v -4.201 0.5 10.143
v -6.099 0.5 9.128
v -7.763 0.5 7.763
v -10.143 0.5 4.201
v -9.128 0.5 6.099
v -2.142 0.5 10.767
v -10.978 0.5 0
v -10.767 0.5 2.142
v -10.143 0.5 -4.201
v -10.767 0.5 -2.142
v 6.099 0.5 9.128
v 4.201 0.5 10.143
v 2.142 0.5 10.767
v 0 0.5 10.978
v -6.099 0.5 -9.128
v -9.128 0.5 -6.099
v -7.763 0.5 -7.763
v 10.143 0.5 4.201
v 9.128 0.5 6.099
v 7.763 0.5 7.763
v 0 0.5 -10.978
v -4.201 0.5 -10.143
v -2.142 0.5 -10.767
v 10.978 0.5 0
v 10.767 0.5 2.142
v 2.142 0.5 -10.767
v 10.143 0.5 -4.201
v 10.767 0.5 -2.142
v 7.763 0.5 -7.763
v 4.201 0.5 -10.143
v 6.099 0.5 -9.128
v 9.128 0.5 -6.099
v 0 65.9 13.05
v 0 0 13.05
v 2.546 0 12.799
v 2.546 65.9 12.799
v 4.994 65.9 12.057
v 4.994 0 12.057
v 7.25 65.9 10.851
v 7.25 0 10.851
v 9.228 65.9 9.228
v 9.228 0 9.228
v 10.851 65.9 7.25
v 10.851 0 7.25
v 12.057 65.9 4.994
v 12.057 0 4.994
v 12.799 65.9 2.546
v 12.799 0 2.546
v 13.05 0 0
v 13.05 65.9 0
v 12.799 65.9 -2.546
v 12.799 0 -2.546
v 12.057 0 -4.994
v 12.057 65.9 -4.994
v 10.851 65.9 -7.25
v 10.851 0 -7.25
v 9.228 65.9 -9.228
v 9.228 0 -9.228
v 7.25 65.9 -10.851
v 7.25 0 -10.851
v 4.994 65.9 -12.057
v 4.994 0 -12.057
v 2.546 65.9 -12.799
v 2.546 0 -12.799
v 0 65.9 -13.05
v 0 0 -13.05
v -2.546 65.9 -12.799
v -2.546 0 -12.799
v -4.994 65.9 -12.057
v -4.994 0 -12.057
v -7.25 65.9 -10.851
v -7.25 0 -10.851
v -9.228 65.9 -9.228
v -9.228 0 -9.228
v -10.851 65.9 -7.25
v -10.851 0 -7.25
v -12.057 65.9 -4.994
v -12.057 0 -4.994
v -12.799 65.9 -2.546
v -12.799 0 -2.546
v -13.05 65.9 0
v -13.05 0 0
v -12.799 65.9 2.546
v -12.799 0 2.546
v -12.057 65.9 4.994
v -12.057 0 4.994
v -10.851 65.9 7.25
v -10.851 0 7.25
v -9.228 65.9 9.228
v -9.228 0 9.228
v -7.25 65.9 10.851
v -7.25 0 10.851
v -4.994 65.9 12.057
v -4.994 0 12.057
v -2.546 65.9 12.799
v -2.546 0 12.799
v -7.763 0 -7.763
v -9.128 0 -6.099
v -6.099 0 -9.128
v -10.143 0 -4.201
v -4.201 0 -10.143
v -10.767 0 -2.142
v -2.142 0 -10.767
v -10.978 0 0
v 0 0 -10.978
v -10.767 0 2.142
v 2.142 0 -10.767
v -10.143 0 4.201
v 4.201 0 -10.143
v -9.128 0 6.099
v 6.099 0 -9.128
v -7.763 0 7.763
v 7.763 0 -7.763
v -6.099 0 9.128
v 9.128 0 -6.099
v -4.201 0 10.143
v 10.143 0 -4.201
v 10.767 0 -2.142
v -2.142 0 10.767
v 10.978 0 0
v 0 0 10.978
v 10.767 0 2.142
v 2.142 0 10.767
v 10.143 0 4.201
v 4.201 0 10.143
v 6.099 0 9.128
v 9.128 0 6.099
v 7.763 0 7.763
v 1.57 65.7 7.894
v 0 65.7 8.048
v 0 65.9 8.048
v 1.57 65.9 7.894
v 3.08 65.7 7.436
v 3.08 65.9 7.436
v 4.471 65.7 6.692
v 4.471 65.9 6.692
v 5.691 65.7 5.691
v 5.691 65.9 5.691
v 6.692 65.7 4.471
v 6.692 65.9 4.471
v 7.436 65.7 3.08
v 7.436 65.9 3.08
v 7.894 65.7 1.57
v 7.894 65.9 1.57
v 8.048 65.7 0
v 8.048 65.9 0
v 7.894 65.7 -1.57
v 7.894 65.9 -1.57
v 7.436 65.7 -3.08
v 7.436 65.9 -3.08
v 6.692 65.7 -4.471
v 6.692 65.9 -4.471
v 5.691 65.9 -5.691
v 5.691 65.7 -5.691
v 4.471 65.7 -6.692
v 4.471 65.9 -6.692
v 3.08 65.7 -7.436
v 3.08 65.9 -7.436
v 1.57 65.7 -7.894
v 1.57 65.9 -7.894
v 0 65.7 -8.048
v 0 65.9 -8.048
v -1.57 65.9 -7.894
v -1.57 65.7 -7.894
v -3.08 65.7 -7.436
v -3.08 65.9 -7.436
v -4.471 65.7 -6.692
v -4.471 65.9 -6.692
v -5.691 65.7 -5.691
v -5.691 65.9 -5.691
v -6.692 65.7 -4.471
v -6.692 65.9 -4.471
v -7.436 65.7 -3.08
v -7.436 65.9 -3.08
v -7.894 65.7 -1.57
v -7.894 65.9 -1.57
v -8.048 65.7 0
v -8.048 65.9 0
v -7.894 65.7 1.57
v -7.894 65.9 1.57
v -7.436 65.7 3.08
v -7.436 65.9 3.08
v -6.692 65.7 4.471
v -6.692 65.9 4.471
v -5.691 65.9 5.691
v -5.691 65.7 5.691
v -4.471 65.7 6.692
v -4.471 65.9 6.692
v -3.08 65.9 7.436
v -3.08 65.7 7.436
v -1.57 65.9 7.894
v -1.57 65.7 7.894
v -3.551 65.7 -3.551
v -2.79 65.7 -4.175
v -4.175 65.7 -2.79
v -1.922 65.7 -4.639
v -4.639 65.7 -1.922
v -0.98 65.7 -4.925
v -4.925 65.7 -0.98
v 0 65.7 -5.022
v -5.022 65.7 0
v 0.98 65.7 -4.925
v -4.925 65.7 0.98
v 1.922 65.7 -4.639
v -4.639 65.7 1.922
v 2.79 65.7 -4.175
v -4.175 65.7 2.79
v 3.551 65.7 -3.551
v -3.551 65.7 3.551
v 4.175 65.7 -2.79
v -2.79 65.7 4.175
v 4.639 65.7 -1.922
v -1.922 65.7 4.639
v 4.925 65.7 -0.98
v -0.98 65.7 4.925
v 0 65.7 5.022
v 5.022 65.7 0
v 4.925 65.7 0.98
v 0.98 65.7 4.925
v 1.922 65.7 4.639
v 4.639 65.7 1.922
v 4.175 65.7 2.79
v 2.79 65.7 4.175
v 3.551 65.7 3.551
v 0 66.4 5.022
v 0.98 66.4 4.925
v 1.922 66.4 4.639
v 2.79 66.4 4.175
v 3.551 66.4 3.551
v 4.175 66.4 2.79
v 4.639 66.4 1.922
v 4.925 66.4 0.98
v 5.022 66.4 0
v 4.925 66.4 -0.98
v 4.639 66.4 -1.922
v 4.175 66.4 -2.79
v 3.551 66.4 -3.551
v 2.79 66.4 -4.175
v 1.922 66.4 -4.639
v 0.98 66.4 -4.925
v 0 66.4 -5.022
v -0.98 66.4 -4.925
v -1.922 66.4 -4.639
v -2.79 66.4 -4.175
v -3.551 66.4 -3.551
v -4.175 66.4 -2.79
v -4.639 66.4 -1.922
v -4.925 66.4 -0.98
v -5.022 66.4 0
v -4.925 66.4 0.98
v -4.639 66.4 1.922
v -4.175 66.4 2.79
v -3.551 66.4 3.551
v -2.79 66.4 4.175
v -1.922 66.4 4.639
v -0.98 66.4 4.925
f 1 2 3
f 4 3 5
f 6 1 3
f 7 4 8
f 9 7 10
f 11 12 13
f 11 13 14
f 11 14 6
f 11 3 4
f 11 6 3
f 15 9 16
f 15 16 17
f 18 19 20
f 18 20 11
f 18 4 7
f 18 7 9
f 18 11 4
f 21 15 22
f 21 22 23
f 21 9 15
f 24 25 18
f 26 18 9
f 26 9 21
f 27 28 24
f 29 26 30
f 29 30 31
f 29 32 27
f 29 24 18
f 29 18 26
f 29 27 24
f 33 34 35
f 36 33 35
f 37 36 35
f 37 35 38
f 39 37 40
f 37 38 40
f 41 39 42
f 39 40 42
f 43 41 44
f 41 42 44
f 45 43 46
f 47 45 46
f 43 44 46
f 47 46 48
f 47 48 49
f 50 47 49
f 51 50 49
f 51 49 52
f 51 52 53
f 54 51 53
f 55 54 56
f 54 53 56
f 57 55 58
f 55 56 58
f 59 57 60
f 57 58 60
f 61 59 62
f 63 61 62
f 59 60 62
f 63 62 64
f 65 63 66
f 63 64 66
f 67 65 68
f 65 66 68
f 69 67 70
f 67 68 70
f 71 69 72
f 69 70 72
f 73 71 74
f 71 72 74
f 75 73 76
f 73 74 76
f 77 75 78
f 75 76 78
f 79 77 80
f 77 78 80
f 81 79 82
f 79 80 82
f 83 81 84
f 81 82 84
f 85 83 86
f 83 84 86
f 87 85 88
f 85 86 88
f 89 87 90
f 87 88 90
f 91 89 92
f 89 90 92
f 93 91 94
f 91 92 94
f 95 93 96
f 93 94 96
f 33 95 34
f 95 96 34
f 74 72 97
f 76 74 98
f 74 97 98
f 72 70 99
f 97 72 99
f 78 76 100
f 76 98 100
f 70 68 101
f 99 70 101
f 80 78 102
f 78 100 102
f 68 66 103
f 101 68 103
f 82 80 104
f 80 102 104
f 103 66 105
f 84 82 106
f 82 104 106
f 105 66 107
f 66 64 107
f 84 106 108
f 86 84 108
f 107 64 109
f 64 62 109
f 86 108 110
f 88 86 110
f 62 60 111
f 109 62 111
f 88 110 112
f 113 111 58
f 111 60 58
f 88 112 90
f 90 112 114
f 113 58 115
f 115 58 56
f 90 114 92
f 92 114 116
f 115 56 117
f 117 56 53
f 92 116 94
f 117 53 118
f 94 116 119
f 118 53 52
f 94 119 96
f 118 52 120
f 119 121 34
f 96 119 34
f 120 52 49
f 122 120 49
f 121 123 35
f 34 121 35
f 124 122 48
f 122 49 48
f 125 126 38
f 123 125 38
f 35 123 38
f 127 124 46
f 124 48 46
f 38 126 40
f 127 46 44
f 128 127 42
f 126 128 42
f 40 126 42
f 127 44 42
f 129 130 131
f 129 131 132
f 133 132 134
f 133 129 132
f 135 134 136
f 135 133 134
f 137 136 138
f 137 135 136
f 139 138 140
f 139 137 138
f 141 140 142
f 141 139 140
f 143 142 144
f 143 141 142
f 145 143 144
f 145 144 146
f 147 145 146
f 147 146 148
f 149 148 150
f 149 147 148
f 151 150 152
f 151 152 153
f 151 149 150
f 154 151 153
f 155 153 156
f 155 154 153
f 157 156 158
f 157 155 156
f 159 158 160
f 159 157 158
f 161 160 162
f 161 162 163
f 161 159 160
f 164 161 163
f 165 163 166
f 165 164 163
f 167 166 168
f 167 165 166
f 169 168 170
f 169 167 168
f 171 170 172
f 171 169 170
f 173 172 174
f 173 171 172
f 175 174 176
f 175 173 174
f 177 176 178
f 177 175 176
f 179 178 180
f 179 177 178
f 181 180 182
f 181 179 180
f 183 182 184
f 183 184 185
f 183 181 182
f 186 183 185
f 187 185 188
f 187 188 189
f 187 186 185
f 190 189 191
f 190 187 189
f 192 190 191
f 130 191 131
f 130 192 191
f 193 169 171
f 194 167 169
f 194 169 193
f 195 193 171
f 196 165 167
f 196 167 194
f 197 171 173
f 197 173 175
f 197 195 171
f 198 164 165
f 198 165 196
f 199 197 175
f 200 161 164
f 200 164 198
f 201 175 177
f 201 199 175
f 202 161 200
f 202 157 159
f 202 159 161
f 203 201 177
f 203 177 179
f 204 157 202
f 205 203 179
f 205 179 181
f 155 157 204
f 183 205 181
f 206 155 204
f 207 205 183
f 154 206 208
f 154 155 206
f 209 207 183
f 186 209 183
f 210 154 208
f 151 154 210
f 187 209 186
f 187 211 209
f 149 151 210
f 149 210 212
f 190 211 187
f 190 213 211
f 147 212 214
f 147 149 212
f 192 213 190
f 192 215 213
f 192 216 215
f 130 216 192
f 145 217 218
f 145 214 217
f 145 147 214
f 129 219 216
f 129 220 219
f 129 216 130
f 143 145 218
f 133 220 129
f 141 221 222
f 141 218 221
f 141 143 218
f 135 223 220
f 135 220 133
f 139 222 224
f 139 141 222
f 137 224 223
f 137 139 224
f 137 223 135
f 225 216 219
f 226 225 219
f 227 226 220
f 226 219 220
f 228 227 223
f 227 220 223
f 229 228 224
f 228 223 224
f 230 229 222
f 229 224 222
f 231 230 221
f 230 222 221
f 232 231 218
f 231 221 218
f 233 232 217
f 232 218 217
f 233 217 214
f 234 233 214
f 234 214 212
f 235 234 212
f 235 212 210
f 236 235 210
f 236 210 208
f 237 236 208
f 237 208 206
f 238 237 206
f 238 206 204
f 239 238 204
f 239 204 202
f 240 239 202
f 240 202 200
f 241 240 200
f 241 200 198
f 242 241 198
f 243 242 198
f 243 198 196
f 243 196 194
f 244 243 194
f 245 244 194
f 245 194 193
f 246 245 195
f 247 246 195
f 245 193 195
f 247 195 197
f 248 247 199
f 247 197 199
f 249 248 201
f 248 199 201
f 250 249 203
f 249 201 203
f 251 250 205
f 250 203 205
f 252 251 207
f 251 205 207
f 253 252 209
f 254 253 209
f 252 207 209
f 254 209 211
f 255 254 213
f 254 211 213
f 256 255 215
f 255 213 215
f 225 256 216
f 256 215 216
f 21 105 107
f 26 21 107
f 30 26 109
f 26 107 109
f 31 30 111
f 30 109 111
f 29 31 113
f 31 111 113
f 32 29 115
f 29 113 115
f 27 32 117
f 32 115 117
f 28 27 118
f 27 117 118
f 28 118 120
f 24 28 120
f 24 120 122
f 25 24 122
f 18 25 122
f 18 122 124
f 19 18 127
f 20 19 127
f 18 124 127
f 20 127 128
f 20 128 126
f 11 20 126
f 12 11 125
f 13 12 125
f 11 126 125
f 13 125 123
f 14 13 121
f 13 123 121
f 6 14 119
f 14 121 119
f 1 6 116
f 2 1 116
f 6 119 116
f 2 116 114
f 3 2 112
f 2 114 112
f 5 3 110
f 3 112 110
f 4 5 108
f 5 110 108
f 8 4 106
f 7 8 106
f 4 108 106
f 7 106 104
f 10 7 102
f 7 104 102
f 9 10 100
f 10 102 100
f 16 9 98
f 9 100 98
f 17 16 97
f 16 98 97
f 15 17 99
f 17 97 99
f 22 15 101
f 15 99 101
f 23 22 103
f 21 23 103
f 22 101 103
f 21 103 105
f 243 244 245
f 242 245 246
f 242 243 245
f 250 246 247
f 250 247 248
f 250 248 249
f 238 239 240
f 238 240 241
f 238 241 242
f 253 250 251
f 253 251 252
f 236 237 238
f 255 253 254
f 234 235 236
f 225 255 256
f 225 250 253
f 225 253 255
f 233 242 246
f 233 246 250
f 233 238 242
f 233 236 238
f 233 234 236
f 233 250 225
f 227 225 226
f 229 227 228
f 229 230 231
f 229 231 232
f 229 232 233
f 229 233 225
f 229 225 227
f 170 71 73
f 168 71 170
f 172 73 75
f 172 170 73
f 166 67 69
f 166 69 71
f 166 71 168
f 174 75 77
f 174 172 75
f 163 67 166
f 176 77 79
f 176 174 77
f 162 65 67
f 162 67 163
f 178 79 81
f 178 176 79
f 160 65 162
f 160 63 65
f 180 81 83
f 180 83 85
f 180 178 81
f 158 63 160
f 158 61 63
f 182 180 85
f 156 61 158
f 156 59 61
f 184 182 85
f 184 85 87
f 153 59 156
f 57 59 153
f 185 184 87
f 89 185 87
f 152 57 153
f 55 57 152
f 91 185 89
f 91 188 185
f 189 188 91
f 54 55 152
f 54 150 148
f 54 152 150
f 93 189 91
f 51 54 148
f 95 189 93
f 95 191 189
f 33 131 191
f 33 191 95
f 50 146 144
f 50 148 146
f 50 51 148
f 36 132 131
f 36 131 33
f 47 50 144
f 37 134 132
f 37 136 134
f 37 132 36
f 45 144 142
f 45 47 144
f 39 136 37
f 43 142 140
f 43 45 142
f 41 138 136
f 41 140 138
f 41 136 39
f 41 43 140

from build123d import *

# Parameters (mm, degrees)
SKETCH_1_R          = 13.05
EXTRUDE_1_DEPTH     = 65.9
SKETCH_2_R          = 10.978194701
CUT_EXTRUDE_1_DEPTH = 0.5
SKETCH_3_R          = 5.021706909
EXTRUDE_2_DEPTH     = 0.5
CUT_EXTRUDE_START   = -0.2
SKETCH_4_R          = 8.048308781
SKETCH_4_R_2        = 5.021706909
CUT_EXTRUDE_2_DEPTH = 0.2


with BuildPart() as part:
    # 草图1 → 凸台-拉伸1 (new body)
    with BuildSketch(Plane(origin=(0, 0, 0), x_dir=(1, 0, 0), z_dir=(0, 1, 0))):
        with Locations(Location((0, 0, 0), (0, 0, 270))):
            Circle(SKETCH_1_R)
    extrude(amount=EXTRUDE_1_DEPTH)

    # 草图2 → 切除-拉伸1 (cut)
    with BuildSketch(Plane.XZ):
        with Locations(Location((0, 0, 0), (0, 0, 270))):
            Circle(SKETCH_2_R)
    extrude(amount=-CUT_EXTRUDE_1_DEPTH, mode=Mode.SUBTRACT)

    # 草图3 → 凸台-拉伸2 (add)
    with BuildSketch(Plane(origin=(0, 65.9, 0), x_dir=(1, 0, 0), z_dir=(0, 1, 0))):
        with Locations(Location((0, 0, 0), (0, 0, 270))):
            Circle(SKETCH_3_R)
    extrude(amount=EXTRUDE_2_DEPTH)

    # 草图4 → 切除-拉伸2 (cut)
    with BuildSketch(Plane(origin=(0, 65.9, 0), x_dir=(1, 0, 0), z_dir=(0, 1, 0)).offset(CUT_EXTRUDE_START)):
        with Locations(Location((0, 0, 0), (0, 0, 270))):
            Circle(SKETCH_4_R)
        with Locations(Location((0, 0, 0), (0, 0, 270))):
            Circle(SKETCH_4_R_2, mode=Mode.SUBTRACT)
    extrude(amount=CUT_EXTRUDE_2_DEPTH, mode=Mode.SUBTRACT)


solid = part.part
